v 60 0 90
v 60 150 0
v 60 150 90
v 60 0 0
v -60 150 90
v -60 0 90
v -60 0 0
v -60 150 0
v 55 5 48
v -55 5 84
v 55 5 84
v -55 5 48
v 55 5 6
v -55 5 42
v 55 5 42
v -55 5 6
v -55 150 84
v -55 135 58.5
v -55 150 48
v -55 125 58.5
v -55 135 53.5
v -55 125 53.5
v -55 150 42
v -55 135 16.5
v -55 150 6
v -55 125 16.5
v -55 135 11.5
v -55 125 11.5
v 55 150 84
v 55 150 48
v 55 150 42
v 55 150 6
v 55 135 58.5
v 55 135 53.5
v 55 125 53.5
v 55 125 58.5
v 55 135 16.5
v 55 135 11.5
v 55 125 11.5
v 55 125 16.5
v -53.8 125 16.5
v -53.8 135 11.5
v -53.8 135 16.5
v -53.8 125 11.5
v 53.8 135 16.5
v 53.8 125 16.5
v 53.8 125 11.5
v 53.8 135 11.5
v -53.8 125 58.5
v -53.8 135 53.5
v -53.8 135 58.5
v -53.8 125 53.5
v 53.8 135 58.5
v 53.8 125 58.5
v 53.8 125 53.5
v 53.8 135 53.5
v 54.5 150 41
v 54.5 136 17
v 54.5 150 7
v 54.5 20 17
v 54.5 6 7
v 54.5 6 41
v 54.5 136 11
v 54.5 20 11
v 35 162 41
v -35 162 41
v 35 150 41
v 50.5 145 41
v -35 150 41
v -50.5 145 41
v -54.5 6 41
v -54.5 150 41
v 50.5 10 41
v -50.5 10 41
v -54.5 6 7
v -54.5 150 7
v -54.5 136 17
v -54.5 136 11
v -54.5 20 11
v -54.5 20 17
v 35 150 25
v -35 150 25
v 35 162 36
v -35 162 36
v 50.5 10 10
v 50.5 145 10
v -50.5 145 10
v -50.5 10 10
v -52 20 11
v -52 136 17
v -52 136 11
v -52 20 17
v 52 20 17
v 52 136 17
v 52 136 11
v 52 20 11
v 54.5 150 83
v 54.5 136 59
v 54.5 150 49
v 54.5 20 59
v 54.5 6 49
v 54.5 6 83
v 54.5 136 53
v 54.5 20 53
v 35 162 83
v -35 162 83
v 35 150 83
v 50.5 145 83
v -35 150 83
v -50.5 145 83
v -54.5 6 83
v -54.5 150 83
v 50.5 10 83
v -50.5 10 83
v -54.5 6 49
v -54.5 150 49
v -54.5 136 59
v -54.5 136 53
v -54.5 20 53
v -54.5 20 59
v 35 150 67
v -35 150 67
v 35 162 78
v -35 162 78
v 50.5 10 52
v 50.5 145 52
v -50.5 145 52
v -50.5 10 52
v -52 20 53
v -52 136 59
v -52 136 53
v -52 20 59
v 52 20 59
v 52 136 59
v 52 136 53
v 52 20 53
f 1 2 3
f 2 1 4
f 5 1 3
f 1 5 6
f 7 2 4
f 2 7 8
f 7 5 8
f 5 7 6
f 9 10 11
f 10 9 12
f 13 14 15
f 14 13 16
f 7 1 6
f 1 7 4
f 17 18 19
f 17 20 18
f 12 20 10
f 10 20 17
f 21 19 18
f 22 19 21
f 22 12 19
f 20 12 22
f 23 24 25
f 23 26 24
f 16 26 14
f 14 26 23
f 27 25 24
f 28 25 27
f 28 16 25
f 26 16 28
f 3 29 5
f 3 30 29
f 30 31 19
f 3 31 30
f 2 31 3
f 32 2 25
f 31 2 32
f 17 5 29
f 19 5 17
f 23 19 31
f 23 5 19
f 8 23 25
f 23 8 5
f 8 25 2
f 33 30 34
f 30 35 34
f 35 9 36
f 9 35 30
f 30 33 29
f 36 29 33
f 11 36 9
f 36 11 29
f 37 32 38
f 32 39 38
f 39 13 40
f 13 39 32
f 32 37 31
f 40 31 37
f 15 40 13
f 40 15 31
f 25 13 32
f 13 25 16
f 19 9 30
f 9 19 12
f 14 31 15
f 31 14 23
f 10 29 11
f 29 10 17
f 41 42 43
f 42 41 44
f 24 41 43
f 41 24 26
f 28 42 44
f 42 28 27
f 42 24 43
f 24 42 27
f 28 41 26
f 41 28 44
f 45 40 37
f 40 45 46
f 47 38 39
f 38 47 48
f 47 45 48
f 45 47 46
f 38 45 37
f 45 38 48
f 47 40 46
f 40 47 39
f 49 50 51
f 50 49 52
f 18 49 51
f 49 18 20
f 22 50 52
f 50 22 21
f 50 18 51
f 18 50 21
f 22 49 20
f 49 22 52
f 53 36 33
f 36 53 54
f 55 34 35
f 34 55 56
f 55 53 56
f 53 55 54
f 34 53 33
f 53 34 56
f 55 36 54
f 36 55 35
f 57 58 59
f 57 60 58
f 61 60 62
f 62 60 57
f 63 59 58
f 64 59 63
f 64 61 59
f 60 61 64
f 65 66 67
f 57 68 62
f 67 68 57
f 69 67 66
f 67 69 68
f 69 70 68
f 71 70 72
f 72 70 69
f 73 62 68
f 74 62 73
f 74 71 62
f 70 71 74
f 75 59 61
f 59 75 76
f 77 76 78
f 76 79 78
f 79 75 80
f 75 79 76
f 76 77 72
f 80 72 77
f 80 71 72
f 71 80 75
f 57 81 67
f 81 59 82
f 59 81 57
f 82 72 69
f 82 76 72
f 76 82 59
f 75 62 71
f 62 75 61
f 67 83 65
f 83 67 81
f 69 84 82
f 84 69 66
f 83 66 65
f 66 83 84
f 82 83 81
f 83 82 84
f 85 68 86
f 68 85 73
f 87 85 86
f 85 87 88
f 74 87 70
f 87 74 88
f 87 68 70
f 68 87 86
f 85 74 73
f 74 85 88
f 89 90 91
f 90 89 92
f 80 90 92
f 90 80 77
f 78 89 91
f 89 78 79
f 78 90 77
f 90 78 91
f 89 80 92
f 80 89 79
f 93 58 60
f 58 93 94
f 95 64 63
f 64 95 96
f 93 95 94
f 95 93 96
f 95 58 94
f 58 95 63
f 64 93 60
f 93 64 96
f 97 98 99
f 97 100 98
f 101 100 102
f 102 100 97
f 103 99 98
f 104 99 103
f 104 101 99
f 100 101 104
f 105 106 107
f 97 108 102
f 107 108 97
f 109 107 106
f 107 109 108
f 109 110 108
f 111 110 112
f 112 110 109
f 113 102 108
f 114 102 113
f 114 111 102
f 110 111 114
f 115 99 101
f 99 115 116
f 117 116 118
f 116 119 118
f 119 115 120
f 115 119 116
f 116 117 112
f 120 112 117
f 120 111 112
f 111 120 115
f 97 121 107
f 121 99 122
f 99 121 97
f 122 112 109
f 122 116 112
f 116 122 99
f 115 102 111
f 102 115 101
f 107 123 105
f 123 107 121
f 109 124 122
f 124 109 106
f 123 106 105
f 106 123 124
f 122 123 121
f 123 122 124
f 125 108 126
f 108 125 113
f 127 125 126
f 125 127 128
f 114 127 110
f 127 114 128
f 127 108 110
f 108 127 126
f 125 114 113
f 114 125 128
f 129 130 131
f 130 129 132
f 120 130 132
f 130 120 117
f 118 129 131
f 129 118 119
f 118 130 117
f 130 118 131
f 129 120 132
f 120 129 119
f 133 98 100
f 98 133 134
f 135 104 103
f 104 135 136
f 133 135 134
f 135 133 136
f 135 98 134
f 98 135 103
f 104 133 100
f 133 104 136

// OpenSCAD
part = "assembly"; // [assembly:Assembly, frame:Frame, drawer:Drawer]
cadverify_only = "";
module instance(name, part, unit = 1) {
    echo(cadverify_instance = [name, part, unit]);
    if (cadverify_only == "" || cadverify_only == name) children();
}
// frame assembly coords: X -60..60, Y 0..150, Z 0..90
module frame_asm() {
    union() {
        translate([-60,0,0]) cube([120,5,90]);
        translate([-60,0,0]) cube([5,150,90]);
        translate([55,0,0]) cube([5,150,90]);
        translate([-55,5,0]) cube([110,145,6]);
        translate([-55,5,42]) cube([110,145,6]);
        translate([-55,5,84]) cube([110,145,6]);
        translate([-55,125,11.5]) cube([1.2,10,5]);
        translate([53.8,125,11.5]) cube([1.2,10,5]);
        translate([-55,125,53.5]) cube([1.2,10,5]);
        translate([53.8,125,53.5]) cube([1.2,10,5]);
    }
}
module frame_print() {
    translate([0,90,0]) rotate([90,0,0]) frame_asm();
}
// drawer part coords: X -54.5..54.5, Y 0..144 body + handle to 156, Z 0..34
module drawer_raw() {
    difference() {
        union() {
            translate([-54.5,0,0]) cube([109,144,34]);
            // handle wedge (solid triangular prism via hull) + tip block, overlapped for manifold union
            hull() {
                translate([-35,143,18]) cube([70,1,1]);
                translate([-35,143,29]) cube([70,1,1]);
                translate([-35,155,29]) cube([70,1,1]);
            }
            translate([-35,143,29]) cube([70,13,5]);
        }
        translate([-50.5,4,3]) cube([101,135,32]);
        translate([-54.5,14,4]) cube([2.5,116,6]);
        translate([52,14,4]) cube([2.5,116,6]);
    }
}
module drawer_part() { drawer_raw(); }
module frame_spec() {
    echo(cadverify_spec = [
        ["bounds", [[-60,0,0],[60,90,150]]],
        ["bodies", 1],
        ["through_holes", 0],
        ["support_faces", [["bed","-z",5000]]],
        ["overhangs_allowed", [
            ["stop tab underside, bridge 1.2mm", [[-55,73,124],[-53.8,79,126]]],
            ["stop tab underside, bridge 1.2mm", [[53.8,73,124],[55,79,126]]],
            ["stop tab underside, bridge 1.2mm", [[-55,31,124],[-53.8,37,126]]],
            ["stop tab underside, bridge 1.2mm", [[53.8,31,124],[55,37,126]]]
        ]],
        ["copies", 1],
        ["details", [
            ["back_panel","material",[[-60,0,0],[60,90,5]],0.9],
            ["stop_tab_ll","material",[[-55,73.5,125],[-53.8,78.5,135]],0.9],
            ["stop_tab_lr","material",[[53.8,73.5,125],[55,78.5,135]],0.9],
            ["stop_tab_ul","material",[[-55,31.5,125],[-53.8,36.5,135]],0.9],
            ["stop_tab_ur","material",[[53.8,31.5,125],[55,36.5,135]],0.9],
            ["lower_cavity","void",[[-55,48,5],[55,84,150]],0.9],
            ["upper_cavity","void",[[-55,6,5],[55,42,150]],0.9],
            ["back","thickness",[0,10,-1],[0,0,1],5]
        ]]
    ]);
}
module drawer_spec() {
    echo(cadverify_spec = [
        ["bounds", [[-54.5,0,0],[54.5,156,34]]],
        ["bodies", 1],
        ["through_holes", 0],
        ["support_faces", [["bed","-z",10000]]],
        ["overhangs_allowed", [
            ["drawer slide groove ceiling, bridge 5mm", [[-54.5,14,9],[-52,130,11]]],
            ["drawer slide groove ceiling, bridge 5mm", [[52,14,9],[54.5,130,11]]],
            ["handle wedge overhang 47deg, self supporting face", [[-35,143,17],[35,157,30]]]
        ]],
        ["copies", 2],
        ["details", [
            ["pull_tip","material",[[-35,150,30],[35,156,34]],0.9],
            ["groove_left","void",[[-54.5,14,4],[-52,130,10]],0.9],
            ["groove_right","void",[[52,14,4],[54.5,130,10]],0.9],
            ["drawer_cavity","void",[[-50.5,4,3],[50.5,139,34]],0.9],
            ["bottom","thickness",[0,70,-1],[0,0,1],3],
            ["side_walls","thickness",[-55.5,70,20],[1,0,0],4],
            ["pull_shape","view",[[-35,144,18],[35,156,34]]]
        ]]
    ]);
}
module assembly_spec() {
    echo(cadverify_spec = [
        ["bounds", [[-60,0,0],[60,162,90]]],
        ["support_faces", [["base","-z",5000]]],
        ["allowed_interferences", []],
        ["motions", [
            ["drawer_lower_slide", ["drawer_lower"], "slide", [0,1,0], [0,105], ["stops", [0,105]]],
            ["drawer_upper_slide", ["drawer_upper"], "slide", [0,1,0], [0,105], ["stops", [0,105]]]
        ]],
        ["assembly_order", [
            [["frame"], [0,0,0]],
            [["drawer_lower"], [0,-1,0], ["flex", [["drawer_lower","frame",0.7,"stop tabs snap into grooves"]]]],
            [["drawer_upper"], [0,-1,0], ["flex", [["drawer_upper","frame",0.7,"stop tabs snap into grooves"]]]]
        ]]
    ]);
}
if (part == "frame") { frame_spec(); frame_print(); }
else if (part == "drawer") { drawer_spec(); drawer_part(); }
else if (part == "assembly") {
    assembly_spec();
    instance("frame","frame",1) frame_asm();
    instance("drawer_lower","drawer",1) translate([0,6,7]) drawer_raw();
    instance("drawer_upper","drawer",1) translate([0,6,49]) drawer_raw();
}
